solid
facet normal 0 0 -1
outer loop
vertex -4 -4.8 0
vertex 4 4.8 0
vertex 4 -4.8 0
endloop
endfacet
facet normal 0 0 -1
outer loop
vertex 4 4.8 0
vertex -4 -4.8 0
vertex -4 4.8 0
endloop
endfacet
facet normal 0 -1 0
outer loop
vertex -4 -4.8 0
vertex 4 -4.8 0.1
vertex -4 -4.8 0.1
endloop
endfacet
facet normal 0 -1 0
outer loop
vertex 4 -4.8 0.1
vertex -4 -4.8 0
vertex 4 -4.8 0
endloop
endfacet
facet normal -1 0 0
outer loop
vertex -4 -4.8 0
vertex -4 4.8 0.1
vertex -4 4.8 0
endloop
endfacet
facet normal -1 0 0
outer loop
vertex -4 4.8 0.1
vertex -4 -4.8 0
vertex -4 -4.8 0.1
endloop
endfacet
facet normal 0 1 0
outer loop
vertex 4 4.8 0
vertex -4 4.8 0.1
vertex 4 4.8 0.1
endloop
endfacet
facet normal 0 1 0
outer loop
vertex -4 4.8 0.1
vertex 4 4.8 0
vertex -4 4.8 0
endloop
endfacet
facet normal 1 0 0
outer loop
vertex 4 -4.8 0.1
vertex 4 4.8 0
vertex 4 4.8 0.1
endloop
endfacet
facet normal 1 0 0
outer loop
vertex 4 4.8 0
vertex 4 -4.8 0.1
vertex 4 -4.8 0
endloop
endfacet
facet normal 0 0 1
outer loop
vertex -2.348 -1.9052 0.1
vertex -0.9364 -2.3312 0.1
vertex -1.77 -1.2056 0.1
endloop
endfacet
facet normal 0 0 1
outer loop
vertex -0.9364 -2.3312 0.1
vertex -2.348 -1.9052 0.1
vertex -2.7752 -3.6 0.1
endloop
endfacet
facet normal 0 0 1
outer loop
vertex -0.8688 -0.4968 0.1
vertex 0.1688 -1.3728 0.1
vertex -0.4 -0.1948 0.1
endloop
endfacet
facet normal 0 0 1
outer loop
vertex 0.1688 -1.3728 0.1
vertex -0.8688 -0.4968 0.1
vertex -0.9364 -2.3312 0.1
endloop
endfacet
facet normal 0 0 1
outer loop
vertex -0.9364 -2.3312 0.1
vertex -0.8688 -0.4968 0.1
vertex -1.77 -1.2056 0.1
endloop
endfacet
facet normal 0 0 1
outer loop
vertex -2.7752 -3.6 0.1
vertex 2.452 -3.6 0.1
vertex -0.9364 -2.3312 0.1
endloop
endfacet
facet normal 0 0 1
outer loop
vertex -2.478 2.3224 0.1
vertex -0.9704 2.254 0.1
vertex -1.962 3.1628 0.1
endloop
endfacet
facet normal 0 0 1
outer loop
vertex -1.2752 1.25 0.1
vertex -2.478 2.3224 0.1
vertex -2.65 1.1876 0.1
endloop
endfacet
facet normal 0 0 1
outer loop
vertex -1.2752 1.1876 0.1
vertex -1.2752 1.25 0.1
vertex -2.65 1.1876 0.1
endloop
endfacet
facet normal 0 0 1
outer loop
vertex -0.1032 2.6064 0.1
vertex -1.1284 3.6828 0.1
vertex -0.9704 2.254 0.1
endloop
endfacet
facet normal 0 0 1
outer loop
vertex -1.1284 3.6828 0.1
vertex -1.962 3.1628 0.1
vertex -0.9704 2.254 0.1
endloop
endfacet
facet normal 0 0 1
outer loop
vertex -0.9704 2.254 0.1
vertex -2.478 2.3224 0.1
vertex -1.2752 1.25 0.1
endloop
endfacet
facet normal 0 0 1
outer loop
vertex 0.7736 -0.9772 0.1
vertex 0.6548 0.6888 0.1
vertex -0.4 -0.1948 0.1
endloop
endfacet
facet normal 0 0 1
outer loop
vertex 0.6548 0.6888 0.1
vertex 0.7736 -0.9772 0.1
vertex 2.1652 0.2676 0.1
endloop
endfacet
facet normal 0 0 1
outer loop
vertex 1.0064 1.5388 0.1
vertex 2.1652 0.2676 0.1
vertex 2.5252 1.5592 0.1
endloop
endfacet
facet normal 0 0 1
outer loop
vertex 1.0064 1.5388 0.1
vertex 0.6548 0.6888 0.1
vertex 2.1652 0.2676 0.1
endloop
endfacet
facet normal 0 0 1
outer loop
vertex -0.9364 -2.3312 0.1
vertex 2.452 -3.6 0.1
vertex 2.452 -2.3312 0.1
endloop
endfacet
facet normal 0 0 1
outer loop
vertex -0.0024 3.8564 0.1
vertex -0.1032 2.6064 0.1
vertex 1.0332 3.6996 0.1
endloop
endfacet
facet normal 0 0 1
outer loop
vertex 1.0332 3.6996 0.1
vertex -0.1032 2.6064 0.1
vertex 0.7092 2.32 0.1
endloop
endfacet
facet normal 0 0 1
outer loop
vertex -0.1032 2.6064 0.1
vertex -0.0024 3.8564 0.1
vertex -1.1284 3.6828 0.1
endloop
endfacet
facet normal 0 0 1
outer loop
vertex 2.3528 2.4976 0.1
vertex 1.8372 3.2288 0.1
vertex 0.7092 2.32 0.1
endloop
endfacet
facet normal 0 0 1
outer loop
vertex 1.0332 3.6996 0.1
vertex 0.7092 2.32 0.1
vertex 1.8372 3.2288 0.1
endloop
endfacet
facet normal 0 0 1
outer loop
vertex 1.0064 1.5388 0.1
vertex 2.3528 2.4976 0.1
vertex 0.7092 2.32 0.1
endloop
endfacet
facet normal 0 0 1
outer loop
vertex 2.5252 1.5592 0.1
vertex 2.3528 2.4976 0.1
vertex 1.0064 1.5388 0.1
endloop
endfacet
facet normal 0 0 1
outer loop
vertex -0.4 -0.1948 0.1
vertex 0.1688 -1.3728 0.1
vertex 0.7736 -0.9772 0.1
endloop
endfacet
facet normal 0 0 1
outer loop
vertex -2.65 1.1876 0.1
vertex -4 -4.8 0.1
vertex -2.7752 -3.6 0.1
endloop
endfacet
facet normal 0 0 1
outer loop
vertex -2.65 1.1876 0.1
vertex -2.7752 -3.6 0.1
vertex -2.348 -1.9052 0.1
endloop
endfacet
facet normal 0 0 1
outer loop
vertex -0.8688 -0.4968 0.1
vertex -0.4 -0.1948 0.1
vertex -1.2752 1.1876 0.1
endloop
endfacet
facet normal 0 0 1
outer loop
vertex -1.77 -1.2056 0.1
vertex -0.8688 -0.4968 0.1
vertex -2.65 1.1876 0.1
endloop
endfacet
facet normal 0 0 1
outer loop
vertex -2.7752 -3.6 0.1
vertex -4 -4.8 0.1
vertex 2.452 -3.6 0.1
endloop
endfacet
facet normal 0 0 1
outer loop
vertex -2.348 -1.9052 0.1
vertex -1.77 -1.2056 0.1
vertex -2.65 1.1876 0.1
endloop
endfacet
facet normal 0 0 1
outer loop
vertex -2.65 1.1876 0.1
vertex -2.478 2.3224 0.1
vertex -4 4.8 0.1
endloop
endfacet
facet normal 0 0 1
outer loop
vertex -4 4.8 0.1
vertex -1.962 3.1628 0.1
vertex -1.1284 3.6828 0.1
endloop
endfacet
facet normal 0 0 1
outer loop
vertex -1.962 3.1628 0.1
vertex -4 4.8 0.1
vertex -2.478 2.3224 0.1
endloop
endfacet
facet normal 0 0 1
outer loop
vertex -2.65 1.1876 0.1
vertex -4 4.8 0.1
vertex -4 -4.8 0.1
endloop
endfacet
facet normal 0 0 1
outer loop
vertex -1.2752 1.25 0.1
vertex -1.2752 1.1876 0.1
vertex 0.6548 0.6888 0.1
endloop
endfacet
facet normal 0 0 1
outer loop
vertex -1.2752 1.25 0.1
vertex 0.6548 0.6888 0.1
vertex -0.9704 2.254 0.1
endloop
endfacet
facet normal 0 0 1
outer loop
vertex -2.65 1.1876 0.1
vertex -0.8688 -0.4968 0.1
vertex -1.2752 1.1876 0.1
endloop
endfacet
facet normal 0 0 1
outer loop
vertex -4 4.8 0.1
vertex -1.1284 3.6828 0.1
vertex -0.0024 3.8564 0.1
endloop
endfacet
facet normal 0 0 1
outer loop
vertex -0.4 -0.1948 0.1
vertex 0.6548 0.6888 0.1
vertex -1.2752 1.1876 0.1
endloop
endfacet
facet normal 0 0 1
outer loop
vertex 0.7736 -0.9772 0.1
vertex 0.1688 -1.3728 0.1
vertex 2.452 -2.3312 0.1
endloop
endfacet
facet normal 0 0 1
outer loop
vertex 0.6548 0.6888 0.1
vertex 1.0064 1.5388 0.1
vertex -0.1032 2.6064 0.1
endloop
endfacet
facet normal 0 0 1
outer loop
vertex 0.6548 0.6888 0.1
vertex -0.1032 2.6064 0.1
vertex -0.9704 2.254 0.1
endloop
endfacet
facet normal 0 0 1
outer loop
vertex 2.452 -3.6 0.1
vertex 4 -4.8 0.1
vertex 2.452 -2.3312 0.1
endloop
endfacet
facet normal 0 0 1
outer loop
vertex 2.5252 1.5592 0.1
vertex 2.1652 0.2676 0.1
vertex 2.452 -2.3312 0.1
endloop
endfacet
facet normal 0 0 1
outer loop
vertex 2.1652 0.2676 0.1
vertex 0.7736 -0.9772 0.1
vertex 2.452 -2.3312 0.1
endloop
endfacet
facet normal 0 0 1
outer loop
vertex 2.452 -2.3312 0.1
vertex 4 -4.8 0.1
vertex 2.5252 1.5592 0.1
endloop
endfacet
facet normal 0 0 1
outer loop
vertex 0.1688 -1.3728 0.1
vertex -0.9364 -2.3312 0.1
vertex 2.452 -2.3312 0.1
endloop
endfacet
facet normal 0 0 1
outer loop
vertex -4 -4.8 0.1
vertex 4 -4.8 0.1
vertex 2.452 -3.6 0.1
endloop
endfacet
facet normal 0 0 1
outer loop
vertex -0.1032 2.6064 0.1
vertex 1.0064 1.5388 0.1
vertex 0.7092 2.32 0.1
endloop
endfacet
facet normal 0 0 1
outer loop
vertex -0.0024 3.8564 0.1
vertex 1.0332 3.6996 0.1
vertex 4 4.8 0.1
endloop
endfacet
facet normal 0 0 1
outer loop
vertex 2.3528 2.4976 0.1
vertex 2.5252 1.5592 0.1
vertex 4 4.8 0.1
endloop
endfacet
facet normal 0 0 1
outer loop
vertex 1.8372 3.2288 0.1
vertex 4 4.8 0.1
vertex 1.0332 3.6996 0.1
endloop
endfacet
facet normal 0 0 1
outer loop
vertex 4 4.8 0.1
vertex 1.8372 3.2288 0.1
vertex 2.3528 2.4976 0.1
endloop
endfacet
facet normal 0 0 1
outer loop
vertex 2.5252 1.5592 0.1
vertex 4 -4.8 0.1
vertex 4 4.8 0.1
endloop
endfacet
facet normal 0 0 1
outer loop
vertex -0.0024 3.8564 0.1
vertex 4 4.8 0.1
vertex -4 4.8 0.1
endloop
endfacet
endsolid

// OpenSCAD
// file: ../p/box5-12.scad
use <../lib.scad>
function ldraw_lib__box5_12() = [
// 0 Box with 5 Faces without Any Edges
// 0 Name: box5-12.dat
// 0 Author: Chris Dee [cwdee]
// 0 !LDRAW_ORG Primitive UPDATE 2009-02
// 0 !LICENSE Licensed under CC BY 4.0 : see CAreadme.txt
// 
// 0 BFC CERTIFY CCW
  [0,"BFC","CERTIFY"],
  [0,"BFC","CCW"],
// 
// 0 !HISTORY 2009-09-03 [PTadmin] Official Update 2009-02
// 
// 
// 4 16 1 1 1 1 1 -1 -1 1 -1 -1 1 1
  [4,16,1,1,1,1,1,-1,-1,1,-1,-1,1,1],
// 4 16 -1 0 1 1 0 1 1 1 1 -1 1 1
  [4,16,-1,0,1,1,0,1,1,1,1,-1,1,1],
// 4 16 -1 0 -1 -1 0 1 -1 1 1 -1 1 -1
  [4,16,-1,0,-1,-1,0,1,-1,1,1,-1,1,-1],
// 4 16 1 0 -1 -1 0 -1 -1 1 -1 1 1 -1
  [4,16,1,0,-1,-1,0,-1,-1,1,-1,1,1,-1],
// 4 16 1 0 1 1 0 -1 1 1 -1 1 1 1
  [4,16,1,0,1,1,0,-1,1,1,-1,1,1,1],
// 0
];
module ldraw_lib__box5_12(step=0, col=false, unit=2/5, alt=false, line=0.2, solid=!$preview)
    makepoly(ldraw_lib__box5_12(), step=step, col=col, unit=unit, alt=alt, line=line, solid=solid);
ldraw_lib__box5_12(line=0.2);
// file: 191888d.scad
use <../lib.scad>
use <../p/box5-12.scad>
function ldraw_lib__191888d() = [
// 0 Sticker  1.2 x  1 with White "2"
// 0 Name: 191888d.dat
// 0 Author: Steffen [Steffen]
// 0 !LDRAW_ORG Part UPDATE 2012-01
// 0 !LICENSE Licensed under CC BY 4.0 : see CAreadme.txt
// 
// 0 BFC CERTIFY CCW
  [0,"BFC","CERTIFY"],
  [0,"BFC","CCW"],
// 
// 0 !KEYWORDS set 7710
// 
// 0 !HISTORY 2012-03-30 [PTadmin] Official Update 2012-01
// 
// 
// 1 16 0 -0.25 0 10 0 0 0 0.25 0 0 0 -12 box5-12.dat
  [1,16,0,-0.25,0,10,0,0,0,0.25,0,0,0,-12, ldraw_lib__box5_12()],
// 3 15 -5.87 -0.25 -4.763 -2.341 -0.25 -5.828 -4.425 -0.25 -3.014
  [3,15,-5.87,-0.25,-4.763,-2.341,-0.25,-5.828,-4.425,-0.25,-3.014],
// 3 15 -2.341 -0.25 -5.828 -5.87 -0.25 -4.763 -6.938 -0.25 -9
  [3,15,-2.341,-0.25,-5.828,-5.87,-0.25,-4.763,-6.938,-0.25,-9],
// 3 15 -2.172 -0.25 -1.242 0.422 -0.25 -3.432 -1 -0.25 -0.487
  [3,15,-2.172,-0.25,-1.242,0.422,-0.25,-3.432,-1,-0.25,-0.487],
// 3 15 0.422 -0.25 -3.432 -2.172 -0.25 -1.242 -2.341 -0.25 -5.828
  [3,15,0.422,-0.25,-3.432,-2.172,-0.25,-1.242,-2.341,-0.25,-5.828],
// 3 15 -2.341 -0.25 -5.828 -2.172 -0.25 -1.242 -4.425 -0.25 -3.014
  [3,15,-2.341,-0.25,-5.828,-2.172,-0.25,-1.242,-4.425,-0.25,-3.014],
// 3 15 -6.938 -0.25 -9 6.13 -0.25 -9 -2.341 -0.25 -5.828
  [3,15,-6.938,-0.25,-9,6.13,-0.25,-9,-2.341,-0.25,-5.828],
// 3 15 -6.195 -0.25 5.806 -2.426 -0.25 5.635 -4.905 -0.25 7.907
  [3,15,-6.195,-0.25,5.806,-2.426,-0.25,5.635,-4.905,-0.25,7.907],
// 3 15 -3.188 -0.25 3.125 -6.195 -0.25 5.806 -6.625 -0.25 2.969
  [3,15,-3.188,-0.25,3.125,-6.195,-0.25,5.806,-6.625,-0.25,2.969],
// 3 15 -3.188 -0.25 2.969 -3.188 -0.25 3.125 -6.625 -0.25 2.969
  [3,15,-3.188,-0.25,2.969,-3.188,-0.25,3.125,-6.625,-0.25,2.969],
// 3 15 -0.258 -0.25 6.516 -2.821 -0.25 9.207 -2.426 -0.25 5.635
  [3,15,-0.258,-0.25,6.516,-2.821,-0.25,9.207,-2.426,-0.25,5.635],
// 3 15 -2.821 -0.25 9.207 -4.905 -0.25 7.907 -2.426 -0.25 5.635
  [3,15,-2.821,-0.25,9.207,-4.905,-0.25,7.907,-2.426,-0.25,5.635],
// 3 15 -2.426 -0.25 5.635 -6.195 -0.25 5.806 -3.188 -0.25 3.125
  [3,15,-2.426,-0.25,5.635,-6.195,-0.25,5.806,-3.188,-0.25,3.125],
// 3 15 1.934 -0.25 -2.443 1.637 -0.25 1.722 -1 -0.25 -0.487
  [3,15,1.934,-0.25,-2.443,1.637,-0.25,1.722,-1,-0.25,-0.487],
// 3 15 1.637 -0.25 1.722 1.934 -0.25 -2.443 5.413 -0.25 0.669
  [3,15,1.637,-0.25,1.722,1.934,-0.25,-2.443,5.413,-0.25,0.669],
// 3 15 2.516 -0.25 3.847 5.413 -0.25 0.669 6.313 -0.25 3.898
  [3,15,2.516,-0.25,3.847,5.413,-0.25,0.669,6.313,-0.25,3.898],
// 3 15 2.516 -0.25 3.847 1.637 -0.25 1.722 5.413 -0.25 0.669
  [3,15,2.516,-0.25,3.847,1.637,-0.25,1.722,5.413,-0.25,0.669],
// 3 15 -2.341 -0.25 -5.828 6.13 -0.25 -9 6.13 -0.25 -5.828
  [3,15,-2.341,-0.25,-5.828,6.13,-0.25,-9,6.13,-0.25,-5.828],
// 3 15 -0.006 -0.25 9.641 -0.258 -0.25 6.516 2.583 -0.25 9.249
  [3,15,-0.006,-0.25,9.641,-0.258,-0.25,6.516,2.583,-0.25,9.249],
// 3 15 2.583 -0.25 9.249 -0.258 -0.25 6.516 1.773 -0.25 5.8
  [3,15,2.583,-0.25,9.249,-0.258,-0.25,6.516,1.773,-0.25,5.8],
// 3 15 -0.258 -0.25 6.516 -0.006 -0.25 9.641 -2.821 -0.25 9.207
  [3,15,-0.258,-0.25,6.516,-0.006,-0.25,9.641,-2.821,-0.25,9.207],
// 3 15 5.882 -0.25 6.244 4.593 -0.25 8.072 1.773 -0.25 5.8
  [3,15,5.882,-0.25,6.244,4.593,-0.25,8.072,1.773,-0.25,5.8],
// 3 15 2.583 -0.25 9.249 1.773 -0.25 5.8 4.593 -0.25 8.072
  [3,15,2.583,-0.25,9.249,1.773,-0.25,5.8,4.593,-0.25,8.072],
// 3 15 2.516 -0.25 3.847 5.882 -0.25 6.244 1.773 -0.25 5.8
  [3,15,2.516,-0.25,3.847,5.882,-0.25,6.244,1.773,-0.25,5.8],
// 3 15 6.313 -0.25 3.898 5.882 -0.25 6.244 2.516 -0.25 3.847
  [3,15,6.313,-0.25,3.898,5.882,-0.25,6.244,2.516,-0.25,3.847],
// 3 15 -1 -0.25 -0.487 0.422 -0.25 -3.432 1.934 -0.25 -2.443
  [3,15,-1,-0.25,-0.487,0.422,-0.25,-3.432,1.934,-0.25,-2.443],
// 3 16 -6.625 -0.25 2.969 -10 -0.25 -12 -6.938 -0.25 -9
  [3,16,-6.625,-0.25,2.969,-10,-0.25,-12,-6.938,-0.25,-9],
// 3 16 -6.625 -0.25 2.969 -6.938 -0.25 -9 -5.87 -0.25 -4.763
  [3,16,-6.625,-0.25,2.969,-6.938,-0.25,-9,-5.87,-0.25,-4.763],
// 3 16 -2.172 -0.25 -1.242 -1 -0.25 -0.487 -3.188 -0.25 2.969
  [3,16,-2.172,-0.25,-1.242,-1,-0.25,-0.487,-3.188,-0.25,2.969],
// 3 16 -4.425 -0.25 -3.014 -2.172 -0.25 -1.242 -6.625 -0.25 2.969
  [3,16,-4.425,-0.25,-3.014,-2.172,-0.25,-1.242,-6.625,-0.25,2.969],
// 3 16 -6.938 -0.25 -9 -10 -0.25 -12 6.13 -0.25 -9
  [3,16,-6.938,-0.25,-9,-10,-0.25,-12,6.13,-0.25,-9],
// 3 16 -5.87 -0.25 -4.763 -4.425 -0.25 -3.014 -6.625 -0.25 2.969
  [3,16,-5.87,-0.25,-4.763,-4.425,-0.25,-3.014,-6.625,-0.25,2.969],
// 3 16 -6.625 -0.25 2.969 -6.195 -0.25 5.806 -10 -0.25 12
  [3,16,-6.625,-0.25,2.969,-6.195,-0.25,5.806,-10,-0.25,12],
// 3 16 -10 -0.25 12 -4.905 -0.25 7.907 -2.821 -0.25 9.207
  [3,16,-10,-0.25,12,-4.905,-0.25,7.907,-2.821,-0.25,9.207],
// 3 16 -4.905 -0.25 7.907 -10 -0.25 12 -6.195 -0.25 5.806
  [3,16,-4.905,-0.25,7.907,-10,-0.25,12,-6.195,-0.25,5.806],
// 3 16 -6.625 -0.25 2.969 -10 -0.25 12 -10 -0.25 -12
  [3,16,-6.625,-0.25,2.969,-10,-0.25,12,-10,-0.25,-12],
// 3 16 -3.188 -0.25 3.125 -3.188 -0.25 2.969 1.637 -0.25 1.722
  [3,16,-3.188,-0.25,3.125,-3.188,-0.25,2.969,1.637,-0.25,1.722],
// 3 16 -3.188 -0.25 3.125 1.637 -0.25 1.722 -2.426 -0.25 5.635
  [3,16,-3.188,-0.25,3.125,1.637,-0.25,1.722,-2.426,-0.25,5.635],
// 3 16 -6.625 -0.25 2.969 -2.172 -0.25 -1.242 -3.188 -0.25 2.969
  [3,16,-6.625,-0.25,2.969,-2.172,-0.25,-1.242,-3.188,-0.25,2.969],
// 3 16 -10 -0.25 12 -2.821 -0.25 9.207 -0.006 -0.25 9.641
  [3,16,-10,-0.25,12,-2.821,-0.25,9.207,-0.006,-0.25,9.641],
// 3 16 -1 -0.25 -0.487 1.637 -0.25 1.722 -3.188 -0.25 2.969
  [3,16,-1,-0.25,-0.487,1.637,-0.25,1.722,-3.188,-0.25,2.969],
// 3 16 1.934 -0.25 -2.443 0.422 -0.25 -3.432 6.13 -0.25 -5.828
  [3,16,1.934,-0.25,-2.443,0.422,-0.25,-3.432,6.13,-0.25,-5.828],
// 3 16 1.637 -0.25 1.722 2.516 -0.25 3.847 -0.258 -0.25 6.516
  [3,16,1.637,-0.25,1.722,2.516,-0.25,3.847,-0.258,-0.25,6.516],
// 3 16 1.637 -0.25 1.722 -0.258 -0.25 6.516 -2.426 -0.25 5.635
  [3,16,1.637,-0.25,1.722,-0.258,-0.25,6.516,-2.426,-0.25,5.635],
// 3 16 6.13 -0.25 -9 10 -0.25 -12 6.13 -0.25 -5.828
  [3,16,6.13,-0.25,-9,10,-0.25,-12,6.13,-0.25,-5.828],
// 3 16 6.313 -0.25 3.898 5.413 -0.25 0.669 6.13 -0.25 -5.828
  [3,16,6.313,-0.25,3.898,5.413,-0.25,0.669,6.13,-0.25,-5.828],
// 3 16 5.413 -0.25 0.669 1.934 -0.25 -2.443 6.13 -0.25 -5.828
  [3,16,5.413,-0.25,0.669,1.934,-0.25,-2.443,6.13,-0.25,-5.828],
// 3 16 6.13 -0.25 -5.828 10 -0.25 -12 6.313 -0.25 3.898
  [3,16,6.13,-0.25,-5.828,10,-0.25,-12,6.313,-0.25,3.898],
// 3 16 0.422 -0.25 -3.432 -2.341 -0.25 -5.828 6.13 -0.25 -5.828
  [3,16,0.422,-0.25,-3.432,-2.341,-0.25,-5.828,6.13,-0.25,-5.828],
// 3 16 -10 -0.25 -12 10 -0.25 -12 6.13 -0.25 -9
  [3,16,-10,-0.25,-12,10,-0.25,-12,6.13,-0.25,-9],
// 3 16 -0.258 -0.25 6.516 2.516 -0.25 3.847 1.773 -0.25 5.8
  [3,16,-0.258,-0.25,6.516,2.516,-0.25,3.847,1.773,-0.25,5.8],
// 3 16 -0.006 -0.25 9.641 2.583 -0.25 9.249 10 -0.25 12
  [3,16,-0.006,-0.25,9.641,2.583,-0.25,9.249,10,-0.25,12],
// 3 16 5.882 -0.25 6.244 6.313 -0.25 3.898 10 -0.25 12
  [3,16,5.882,-0.25,6.244,6.313,-0.25,3.898,10,-0.25,12],
// 3 16 4.593 -0.25 8.072 10 -0.25 12 2.583 -0.25 9.249
  [3,16,4.593,-0.25,8.072,10,-0.25,12,2.583,-0.25,9.249],
// 3 16 10 -0.25 12 4.593 -0.25 8.072 5.882 -0.25 6.244
  [3,16,10,-0.25,12,4.593,-0.25,8.072,5.882,-0.25,6.244],
// 3 16 6.313 -0.25 3.898 10 -0.25 -12 10 -0.25 12
  [3,16,6.313,-0.25,3.898,10,-0.25,-12,10,-0.25,12],
// 3 16 -0.006 -0.25 9.641 10 -0.25 12 -10 -0.25 12
  [3,16,-0.006,-0.25,9.641,10,-0.25,12,-10,-0.25,12],
];
module ldraw_lib__191888d(step=0, col=false, unit=2/5, alt=false, line=0.2, solid=!$preview)
    makepoly(ldraw_lib__191888d(), step=step, col=col, unit=unit, alt=alt, line=line, solid=solid);
ldraw_lib__191888d(line=0.2);
// main file
use <../lib.scad>
use <191888d.scad>
function ldraw_lib__196925d() = [
// 0 =Sticker  1.2 x  1 with White "2"
// 0 Name: 196925d.dat
// 0 Author: Takeshi Takahashi [RainbowDolphin]
// 0 !LDRAW_ORG Part Alias UPDATE 2025-03
// 0 !LICENSE Licensed under CC BY 4.0 : see CAreadme.txt
// 
// 0 BFC CERTIFY CCW
  [0,"BFC","CERTIFY"],
  [0,"BFC","CCW"],
// 
// 0 !KEYWORDS Bricklink 7715stk01, Brickowl 717614
// 0 !KEYWORDS Push-Along Passenger Steam Train, Rebrickable 196925, Set 7715
// 0 !KEYWORDS Trains
// 
// 0 !HISTORY 2025-03-30 [OrionP] Official Update 2025-03
// 
// 1 16 0 0 0 1 0 0 0 1 0 0 0 1 191888d.dat
  [1,16,0,0,0,1,0,0,0,1,0,0,0,1, ldraw_lib__191888d()],
];
module ldraw_lib__196925d(step=0, col=false, unit=2/5, alt=false, line=0.2, solid=!$preview)
    makepoly(ldraw_lib__196925d(), step=step, col=col, unit=unit, alt=alt, line=line, solid=solid);
ldraw_lib__196925d(line=0.2);
